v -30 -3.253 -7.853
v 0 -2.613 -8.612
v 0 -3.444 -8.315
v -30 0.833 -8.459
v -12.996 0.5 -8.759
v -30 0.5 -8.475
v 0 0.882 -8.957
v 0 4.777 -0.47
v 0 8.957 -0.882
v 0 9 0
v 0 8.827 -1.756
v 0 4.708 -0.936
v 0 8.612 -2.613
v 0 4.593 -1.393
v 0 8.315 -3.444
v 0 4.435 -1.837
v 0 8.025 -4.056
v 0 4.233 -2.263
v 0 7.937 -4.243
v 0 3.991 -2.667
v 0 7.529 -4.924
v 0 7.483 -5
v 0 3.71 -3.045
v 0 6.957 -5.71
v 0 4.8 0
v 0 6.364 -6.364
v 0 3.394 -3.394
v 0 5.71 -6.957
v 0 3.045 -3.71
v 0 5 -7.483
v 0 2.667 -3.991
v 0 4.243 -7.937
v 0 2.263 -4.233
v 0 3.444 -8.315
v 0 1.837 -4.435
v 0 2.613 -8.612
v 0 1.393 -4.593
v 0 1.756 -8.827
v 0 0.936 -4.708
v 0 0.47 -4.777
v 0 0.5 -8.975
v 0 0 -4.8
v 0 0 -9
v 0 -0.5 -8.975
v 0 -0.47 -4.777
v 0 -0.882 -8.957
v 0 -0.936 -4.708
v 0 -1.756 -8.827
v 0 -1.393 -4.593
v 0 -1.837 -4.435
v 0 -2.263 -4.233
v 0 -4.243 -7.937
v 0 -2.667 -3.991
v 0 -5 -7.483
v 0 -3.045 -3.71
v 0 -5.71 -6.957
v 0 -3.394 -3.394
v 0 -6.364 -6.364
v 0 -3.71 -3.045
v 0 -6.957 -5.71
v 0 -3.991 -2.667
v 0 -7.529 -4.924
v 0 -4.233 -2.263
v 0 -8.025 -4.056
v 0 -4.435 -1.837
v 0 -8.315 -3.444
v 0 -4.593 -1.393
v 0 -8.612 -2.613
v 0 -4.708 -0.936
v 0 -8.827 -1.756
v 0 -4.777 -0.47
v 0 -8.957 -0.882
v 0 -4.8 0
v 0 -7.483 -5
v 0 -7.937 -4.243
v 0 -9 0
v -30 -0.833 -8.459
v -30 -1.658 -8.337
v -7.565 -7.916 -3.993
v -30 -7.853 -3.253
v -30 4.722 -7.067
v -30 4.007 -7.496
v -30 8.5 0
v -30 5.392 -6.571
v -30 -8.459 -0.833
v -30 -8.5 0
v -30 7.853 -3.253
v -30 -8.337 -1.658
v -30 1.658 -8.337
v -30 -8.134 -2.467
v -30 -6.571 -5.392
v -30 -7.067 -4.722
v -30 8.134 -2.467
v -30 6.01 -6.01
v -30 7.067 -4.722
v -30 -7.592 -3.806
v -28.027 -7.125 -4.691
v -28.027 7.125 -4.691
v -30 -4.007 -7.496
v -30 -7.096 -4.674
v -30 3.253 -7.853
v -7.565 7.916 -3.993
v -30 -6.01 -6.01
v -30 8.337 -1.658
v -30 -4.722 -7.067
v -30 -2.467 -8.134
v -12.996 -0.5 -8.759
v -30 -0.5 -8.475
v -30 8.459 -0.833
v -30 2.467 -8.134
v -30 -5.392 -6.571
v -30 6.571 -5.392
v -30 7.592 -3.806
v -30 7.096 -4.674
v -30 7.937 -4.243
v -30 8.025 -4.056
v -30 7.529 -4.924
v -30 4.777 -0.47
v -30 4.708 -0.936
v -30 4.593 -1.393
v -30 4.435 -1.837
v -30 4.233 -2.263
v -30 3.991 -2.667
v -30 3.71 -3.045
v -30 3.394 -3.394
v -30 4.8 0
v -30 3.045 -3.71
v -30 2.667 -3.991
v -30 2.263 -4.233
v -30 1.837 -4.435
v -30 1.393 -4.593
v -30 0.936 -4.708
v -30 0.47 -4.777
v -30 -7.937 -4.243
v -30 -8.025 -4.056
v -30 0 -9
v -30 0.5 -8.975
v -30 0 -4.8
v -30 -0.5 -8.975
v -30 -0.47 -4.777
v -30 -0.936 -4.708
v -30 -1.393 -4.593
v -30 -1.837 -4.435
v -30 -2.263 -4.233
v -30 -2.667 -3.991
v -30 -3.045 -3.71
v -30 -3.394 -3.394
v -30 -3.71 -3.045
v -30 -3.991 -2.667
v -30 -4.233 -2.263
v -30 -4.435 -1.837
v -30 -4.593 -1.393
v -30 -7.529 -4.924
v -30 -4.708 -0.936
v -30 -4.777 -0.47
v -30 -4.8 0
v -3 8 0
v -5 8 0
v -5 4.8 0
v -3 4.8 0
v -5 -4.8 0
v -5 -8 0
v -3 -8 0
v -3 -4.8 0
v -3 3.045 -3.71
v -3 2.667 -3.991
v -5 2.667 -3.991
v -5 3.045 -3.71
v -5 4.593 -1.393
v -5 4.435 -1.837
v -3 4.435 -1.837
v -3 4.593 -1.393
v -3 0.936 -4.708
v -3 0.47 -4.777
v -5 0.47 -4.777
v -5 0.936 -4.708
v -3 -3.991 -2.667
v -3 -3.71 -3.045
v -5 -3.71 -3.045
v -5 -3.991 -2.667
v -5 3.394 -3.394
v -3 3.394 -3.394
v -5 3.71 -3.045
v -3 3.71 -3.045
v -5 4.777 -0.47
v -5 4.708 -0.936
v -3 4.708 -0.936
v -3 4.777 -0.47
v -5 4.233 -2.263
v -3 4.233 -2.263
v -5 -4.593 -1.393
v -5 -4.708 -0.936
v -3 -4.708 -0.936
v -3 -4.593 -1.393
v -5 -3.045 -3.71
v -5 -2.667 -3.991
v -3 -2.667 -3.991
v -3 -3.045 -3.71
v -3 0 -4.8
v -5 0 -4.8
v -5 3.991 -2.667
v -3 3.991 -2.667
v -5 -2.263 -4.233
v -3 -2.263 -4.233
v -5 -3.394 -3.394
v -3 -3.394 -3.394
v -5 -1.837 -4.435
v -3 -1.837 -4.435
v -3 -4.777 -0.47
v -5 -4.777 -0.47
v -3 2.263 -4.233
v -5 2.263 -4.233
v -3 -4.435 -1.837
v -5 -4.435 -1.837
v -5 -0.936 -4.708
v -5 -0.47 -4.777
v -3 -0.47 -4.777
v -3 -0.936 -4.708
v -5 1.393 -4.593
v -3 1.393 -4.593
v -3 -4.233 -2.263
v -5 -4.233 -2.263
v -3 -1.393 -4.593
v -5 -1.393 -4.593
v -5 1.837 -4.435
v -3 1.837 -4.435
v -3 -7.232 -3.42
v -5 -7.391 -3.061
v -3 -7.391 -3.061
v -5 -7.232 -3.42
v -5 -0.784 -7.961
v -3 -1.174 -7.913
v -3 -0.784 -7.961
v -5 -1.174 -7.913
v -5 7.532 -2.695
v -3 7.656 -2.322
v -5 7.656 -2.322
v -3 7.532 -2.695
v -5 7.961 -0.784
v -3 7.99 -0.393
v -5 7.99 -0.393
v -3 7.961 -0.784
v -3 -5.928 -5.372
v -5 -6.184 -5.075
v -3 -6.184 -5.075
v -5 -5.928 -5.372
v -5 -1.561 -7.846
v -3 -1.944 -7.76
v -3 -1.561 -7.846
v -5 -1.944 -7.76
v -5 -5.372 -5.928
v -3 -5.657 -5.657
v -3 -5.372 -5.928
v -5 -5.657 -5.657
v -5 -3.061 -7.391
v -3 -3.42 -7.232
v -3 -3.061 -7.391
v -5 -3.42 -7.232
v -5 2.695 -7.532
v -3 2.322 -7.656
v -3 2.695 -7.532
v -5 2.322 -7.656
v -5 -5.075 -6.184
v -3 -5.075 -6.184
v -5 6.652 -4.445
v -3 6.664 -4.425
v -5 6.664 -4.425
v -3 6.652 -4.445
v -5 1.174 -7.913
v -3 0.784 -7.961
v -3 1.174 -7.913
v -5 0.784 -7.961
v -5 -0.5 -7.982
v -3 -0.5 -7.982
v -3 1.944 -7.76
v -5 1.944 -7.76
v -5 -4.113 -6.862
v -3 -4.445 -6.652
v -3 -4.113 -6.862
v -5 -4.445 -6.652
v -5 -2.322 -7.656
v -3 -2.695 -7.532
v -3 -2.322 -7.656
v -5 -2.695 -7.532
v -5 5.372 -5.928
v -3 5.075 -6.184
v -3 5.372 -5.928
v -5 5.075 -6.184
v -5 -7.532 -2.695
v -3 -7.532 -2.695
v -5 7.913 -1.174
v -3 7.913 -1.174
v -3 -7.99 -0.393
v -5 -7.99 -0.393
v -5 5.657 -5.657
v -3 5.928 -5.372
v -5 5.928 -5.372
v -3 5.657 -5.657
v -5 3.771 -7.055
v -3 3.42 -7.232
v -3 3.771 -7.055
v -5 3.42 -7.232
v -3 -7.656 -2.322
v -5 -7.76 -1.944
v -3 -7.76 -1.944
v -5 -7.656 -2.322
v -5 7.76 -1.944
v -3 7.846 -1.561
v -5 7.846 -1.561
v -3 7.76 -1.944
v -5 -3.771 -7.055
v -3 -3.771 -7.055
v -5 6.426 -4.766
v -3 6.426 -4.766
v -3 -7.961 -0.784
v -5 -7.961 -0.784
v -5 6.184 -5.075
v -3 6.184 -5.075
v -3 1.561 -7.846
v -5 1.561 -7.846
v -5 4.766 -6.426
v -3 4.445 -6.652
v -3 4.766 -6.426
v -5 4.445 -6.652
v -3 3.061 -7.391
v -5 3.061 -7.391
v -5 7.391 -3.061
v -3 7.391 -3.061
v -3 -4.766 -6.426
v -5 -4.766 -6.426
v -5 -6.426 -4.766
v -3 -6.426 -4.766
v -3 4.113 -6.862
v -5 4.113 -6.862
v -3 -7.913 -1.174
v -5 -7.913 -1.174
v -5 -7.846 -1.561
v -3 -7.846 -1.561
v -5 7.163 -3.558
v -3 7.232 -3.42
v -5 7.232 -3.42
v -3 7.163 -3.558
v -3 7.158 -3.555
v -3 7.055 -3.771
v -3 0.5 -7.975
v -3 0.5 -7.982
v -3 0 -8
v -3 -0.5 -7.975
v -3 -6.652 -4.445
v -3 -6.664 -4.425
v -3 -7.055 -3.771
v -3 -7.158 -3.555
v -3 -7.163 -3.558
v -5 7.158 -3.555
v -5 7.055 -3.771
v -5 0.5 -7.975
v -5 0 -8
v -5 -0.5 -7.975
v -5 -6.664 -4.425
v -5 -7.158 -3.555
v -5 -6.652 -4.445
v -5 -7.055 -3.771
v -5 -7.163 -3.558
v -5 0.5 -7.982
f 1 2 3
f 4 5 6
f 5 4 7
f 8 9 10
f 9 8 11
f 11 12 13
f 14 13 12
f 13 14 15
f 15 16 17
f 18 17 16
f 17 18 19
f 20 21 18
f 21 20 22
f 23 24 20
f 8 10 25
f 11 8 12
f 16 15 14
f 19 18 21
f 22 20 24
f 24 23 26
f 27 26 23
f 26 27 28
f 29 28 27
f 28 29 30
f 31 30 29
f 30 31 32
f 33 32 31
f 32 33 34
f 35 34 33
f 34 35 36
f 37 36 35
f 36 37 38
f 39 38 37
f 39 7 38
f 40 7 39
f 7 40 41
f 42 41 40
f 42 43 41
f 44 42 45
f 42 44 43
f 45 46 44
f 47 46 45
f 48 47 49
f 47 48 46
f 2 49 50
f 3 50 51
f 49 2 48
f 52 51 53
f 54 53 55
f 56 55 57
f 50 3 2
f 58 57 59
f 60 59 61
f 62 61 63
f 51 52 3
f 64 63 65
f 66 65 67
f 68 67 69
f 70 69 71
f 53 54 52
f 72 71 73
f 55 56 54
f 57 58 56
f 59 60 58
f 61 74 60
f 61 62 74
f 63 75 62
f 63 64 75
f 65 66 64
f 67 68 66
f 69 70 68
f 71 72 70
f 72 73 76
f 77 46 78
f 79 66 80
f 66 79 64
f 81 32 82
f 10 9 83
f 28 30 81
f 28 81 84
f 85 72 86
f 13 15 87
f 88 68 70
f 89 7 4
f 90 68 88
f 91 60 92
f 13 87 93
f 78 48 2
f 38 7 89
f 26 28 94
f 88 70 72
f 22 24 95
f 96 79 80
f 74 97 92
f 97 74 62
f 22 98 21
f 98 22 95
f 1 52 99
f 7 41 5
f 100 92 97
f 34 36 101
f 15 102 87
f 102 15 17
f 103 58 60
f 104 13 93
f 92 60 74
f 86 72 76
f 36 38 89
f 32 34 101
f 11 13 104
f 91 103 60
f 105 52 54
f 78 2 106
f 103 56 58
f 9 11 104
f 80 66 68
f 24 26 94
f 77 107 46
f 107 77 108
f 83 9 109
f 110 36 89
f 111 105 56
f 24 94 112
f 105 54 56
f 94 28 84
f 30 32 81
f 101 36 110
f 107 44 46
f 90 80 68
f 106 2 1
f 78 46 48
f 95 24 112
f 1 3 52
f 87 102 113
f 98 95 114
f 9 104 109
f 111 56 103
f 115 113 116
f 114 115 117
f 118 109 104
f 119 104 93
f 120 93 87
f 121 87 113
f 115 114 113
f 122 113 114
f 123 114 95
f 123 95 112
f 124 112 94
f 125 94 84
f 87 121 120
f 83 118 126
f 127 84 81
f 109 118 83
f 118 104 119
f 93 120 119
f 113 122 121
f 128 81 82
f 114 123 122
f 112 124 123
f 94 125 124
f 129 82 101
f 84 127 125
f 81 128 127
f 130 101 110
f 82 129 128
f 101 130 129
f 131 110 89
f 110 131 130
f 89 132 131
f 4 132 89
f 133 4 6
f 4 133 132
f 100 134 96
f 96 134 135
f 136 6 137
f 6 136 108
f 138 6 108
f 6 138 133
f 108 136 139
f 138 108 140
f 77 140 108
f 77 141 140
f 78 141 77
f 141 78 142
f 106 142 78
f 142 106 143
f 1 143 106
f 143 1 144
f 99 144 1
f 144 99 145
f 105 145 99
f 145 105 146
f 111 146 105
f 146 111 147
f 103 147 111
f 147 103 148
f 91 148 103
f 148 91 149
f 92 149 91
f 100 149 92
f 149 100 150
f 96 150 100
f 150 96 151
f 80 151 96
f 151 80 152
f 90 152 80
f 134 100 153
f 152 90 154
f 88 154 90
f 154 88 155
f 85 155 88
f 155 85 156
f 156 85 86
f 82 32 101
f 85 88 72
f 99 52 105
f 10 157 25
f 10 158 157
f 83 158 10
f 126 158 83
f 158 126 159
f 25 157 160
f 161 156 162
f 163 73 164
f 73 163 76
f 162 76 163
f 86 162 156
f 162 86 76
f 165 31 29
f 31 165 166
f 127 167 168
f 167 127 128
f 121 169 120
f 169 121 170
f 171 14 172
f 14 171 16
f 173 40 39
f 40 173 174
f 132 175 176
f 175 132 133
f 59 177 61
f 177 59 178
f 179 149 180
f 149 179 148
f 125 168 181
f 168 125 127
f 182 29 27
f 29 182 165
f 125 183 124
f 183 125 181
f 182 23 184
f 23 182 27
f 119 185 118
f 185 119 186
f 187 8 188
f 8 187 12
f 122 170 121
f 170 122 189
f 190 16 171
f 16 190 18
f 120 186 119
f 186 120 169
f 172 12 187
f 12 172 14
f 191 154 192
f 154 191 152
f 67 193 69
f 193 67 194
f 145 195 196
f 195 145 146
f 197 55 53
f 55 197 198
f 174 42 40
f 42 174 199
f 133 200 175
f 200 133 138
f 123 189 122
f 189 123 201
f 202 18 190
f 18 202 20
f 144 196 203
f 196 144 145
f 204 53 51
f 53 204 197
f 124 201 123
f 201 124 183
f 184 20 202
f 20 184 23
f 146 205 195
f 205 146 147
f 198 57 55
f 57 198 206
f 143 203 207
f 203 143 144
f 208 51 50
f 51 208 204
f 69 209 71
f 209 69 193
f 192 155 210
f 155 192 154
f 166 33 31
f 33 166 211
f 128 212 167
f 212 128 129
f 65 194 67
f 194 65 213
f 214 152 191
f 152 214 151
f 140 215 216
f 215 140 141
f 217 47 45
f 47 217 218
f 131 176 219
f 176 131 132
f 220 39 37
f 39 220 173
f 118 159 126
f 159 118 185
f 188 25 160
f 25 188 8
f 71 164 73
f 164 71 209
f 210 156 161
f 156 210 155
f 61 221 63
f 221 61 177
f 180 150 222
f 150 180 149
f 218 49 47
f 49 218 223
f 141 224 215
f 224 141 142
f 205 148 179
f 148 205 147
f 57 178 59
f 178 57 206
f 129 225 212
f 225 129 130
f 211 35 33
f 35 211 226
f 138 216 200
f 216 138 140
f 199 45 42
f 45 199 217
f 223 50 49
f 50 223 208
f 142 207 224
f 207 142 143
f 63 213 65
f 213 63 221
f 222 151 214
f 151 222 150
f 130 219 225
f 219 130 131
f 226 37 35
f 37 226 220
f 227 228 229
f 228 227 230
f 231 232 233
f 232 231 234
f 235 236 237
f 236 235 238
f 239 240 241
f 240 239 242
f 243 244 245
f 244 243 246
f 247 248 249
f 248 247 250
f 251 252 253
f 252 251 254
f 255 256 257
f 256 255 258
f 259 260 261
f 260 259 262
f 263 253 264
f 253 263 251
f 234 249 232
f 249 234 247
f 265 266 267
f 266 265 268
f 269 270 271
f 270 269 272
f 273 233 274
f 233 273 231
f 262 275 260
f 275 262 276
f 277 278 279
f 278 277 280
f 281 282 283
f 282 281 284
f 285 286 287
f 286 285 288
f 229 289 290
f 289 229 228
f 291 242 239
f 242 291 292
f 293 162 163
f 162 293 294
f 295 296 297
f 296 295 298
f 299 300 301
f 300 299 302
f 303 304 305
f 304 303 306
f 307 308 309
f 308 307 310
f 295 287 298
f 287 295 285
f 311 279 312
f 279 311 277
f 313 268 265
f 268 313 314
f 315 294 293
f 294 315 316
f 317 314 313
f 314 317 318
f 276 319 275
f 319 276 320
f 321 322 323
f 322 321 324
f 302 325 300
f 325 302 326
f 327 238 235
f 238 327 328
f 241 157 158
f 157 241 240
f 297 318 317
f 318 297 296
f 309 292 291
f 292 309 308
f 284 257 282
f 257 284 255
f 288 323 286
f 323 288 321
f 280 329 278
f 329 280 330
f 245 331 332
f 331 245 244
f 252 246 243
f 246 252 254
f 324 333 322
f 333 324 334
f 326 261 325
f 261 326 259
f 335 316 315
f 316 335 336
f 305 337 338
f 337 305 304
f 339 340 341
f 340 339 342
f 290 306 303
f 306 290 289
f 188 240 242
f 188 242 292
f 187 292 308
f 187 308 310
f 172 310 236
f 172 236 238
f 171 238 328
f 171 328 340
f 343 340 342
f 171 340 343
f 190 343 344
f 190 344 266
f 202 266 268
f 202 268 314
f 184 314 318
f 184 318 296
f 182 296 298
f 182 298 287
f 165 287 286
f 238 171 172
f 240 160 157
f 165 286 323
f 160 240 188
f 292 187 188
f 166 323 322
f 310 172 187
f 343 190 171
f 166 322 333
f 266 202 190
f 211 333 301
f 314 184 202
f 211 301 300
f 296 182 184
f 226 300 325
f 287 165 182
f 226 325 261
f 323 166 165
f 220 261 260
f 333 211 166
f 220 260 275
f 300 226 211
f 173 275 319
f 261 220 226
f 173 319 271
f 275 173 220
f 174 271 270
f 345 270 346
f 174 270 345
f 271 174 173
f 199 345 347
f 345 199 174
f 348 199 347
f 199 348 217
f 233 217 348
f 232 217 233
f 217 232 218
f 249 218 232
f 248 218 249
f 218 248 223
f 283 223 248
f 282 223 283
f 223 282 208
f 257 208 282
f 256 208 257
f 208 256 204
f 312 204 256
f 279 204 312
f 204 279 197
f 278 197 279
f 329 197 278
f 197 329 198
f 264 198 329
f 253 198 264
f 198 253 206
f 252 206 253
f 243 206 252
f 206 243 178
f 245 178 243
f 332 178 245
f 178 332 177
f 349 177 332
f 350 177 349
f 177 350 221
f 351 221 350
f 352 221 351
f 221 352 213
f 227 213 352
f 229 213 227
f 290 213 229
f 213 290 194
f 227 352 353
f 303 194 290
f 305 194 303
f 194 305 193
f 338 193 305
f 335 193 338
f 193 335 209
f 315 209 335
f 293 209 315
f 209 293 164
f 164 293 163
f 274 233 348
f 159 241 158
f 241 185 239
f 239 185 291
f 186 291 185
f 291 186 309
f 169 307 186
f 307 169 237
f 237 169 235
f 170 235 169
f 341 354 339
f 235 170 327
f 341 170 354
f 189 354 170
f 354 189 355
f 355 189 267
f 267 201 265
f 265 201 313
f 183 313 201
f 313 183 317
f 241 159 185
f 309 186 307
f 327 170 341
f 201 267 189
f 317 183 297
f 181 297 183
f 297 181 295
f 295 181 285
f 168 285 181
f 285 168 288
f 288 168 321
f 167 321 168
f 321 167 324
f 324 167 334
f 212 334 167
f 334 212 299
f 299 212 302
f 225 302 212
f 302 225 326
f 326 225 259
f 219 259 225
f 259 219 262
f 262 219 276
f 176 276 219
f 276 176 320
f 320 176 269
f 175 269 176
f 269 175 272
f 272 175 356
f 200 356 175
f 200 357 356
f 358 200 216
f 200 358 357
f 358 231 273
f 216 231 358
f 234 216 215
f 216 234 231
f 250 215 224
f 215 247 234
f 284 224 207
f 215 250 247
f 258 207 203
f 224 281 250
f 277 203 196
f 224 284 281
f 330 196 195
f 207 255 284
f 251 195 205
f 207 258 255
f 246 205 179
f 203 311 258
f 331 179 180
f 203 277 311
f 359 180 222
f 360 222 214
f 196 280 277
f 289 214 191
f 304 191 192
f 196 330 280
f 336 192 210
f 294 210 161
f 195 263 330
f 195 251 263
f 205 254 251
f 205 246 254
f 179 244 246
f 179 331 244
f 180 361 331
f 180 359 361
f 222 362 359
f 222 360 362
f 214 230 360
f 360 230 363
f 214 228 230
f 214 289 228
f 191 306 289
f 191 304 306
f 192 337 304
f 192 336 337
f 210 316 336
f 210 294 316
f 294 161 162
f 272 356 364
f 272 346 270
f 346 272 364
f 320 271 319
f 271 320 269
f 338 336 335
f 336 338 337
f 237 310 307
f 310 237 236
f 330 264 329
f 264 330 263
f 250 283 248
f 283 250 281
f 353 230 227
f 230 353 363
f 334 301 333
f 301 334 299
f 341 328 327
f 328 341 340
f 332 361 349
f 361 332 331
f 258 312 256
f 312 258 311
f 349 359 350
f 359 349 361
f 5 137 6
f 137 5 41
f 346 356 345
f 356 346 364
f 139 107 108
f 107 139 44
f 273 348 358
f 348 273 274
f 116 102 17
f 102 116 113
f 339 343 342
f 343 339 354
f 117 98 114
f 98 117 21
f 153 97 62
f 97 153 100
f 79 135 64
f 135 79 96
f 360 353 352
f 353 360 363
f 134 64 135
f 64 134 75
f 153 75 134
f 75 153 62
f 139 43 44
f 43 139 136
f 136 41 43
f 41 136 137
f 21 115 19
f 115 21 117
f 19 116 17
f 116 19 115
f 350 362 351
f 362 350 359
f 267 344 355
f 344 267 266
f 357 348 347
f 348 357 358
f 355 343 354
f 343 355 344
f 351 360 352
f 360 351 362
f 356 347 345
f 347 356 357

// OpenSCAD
TUBE_INNER_DIAM = 17.5 + 0.5;
FIN = 1;
INNER_ROD_DIAM = 8.6 + 1;
OUTER_ROD_DIAM = 15.5 + 0.5; // (0.5 fudge)
DEPTH = 3;
TOTAL_DEPTH = 30;
DEPTH_OFFSET = 2;
FLATTEN = 0;

module main() {
    difference() {
        cylinder(h=TOTAL_DEPTH, r1=TUBE_INNER_DIAM * 0.5, r2=(TUBE_INNER_DIAM-1) * 0.5, $fn=64);
        translate([0, -1 * TUBE_INNER_DIAM, 0]) cube([TUBE_INNER_DIAM * 2, TUBE_INNER_DIAM * 2, TOTAL_DEPTH]); 
        cylinder(h=TOTAL_DEPTH, d=INNER_ROD_DIAM, $fn=64);
        translate([0, 0, DEPTH]) cylinder(h=DEPTH_OFFSET, d=OUTER_ROD_DIAM, $fn=128);
    }
}

module fins() {
    difference() {
        intersection() {
            cylinder(h=TOTAL_DEPTH, d=TUBE_INNER_DIAM, $fn=64);
            STEPS = 3;
            for(i=[0:1:3]) {
                rotate([0, 0, i * (360 / STEPS)]) translate([0, 0, 0.5 * TOTAL_DEPTH]) cube([TUBE_INNER_DIAM, FIN, TOTAL_DEPTH], center=true);
            }
        }
        cylinder(h=TOTAL_DEPTH, d=OUTER_ROD_DIAM, $fn=64);
        translate([0, -1 * TUBE_INNER_DIAM, 0]) cube([TUBE_INNER_DIAM * 2, TUBE_INNER_DIAM * 2, TOTAL_DEPTH]); 
    }
}


rotate([0, -90, 0])
difference() {
    union() {
        main();
        fins();
    }
    translate([-0.5 * TUBE_INNER_DIAM, -0.5 * TUBE_INNER_DIAM, 0]) cube([FLATTEN, TUBE_INNER_DIAM, TOTAL_DEPTH]);
}
